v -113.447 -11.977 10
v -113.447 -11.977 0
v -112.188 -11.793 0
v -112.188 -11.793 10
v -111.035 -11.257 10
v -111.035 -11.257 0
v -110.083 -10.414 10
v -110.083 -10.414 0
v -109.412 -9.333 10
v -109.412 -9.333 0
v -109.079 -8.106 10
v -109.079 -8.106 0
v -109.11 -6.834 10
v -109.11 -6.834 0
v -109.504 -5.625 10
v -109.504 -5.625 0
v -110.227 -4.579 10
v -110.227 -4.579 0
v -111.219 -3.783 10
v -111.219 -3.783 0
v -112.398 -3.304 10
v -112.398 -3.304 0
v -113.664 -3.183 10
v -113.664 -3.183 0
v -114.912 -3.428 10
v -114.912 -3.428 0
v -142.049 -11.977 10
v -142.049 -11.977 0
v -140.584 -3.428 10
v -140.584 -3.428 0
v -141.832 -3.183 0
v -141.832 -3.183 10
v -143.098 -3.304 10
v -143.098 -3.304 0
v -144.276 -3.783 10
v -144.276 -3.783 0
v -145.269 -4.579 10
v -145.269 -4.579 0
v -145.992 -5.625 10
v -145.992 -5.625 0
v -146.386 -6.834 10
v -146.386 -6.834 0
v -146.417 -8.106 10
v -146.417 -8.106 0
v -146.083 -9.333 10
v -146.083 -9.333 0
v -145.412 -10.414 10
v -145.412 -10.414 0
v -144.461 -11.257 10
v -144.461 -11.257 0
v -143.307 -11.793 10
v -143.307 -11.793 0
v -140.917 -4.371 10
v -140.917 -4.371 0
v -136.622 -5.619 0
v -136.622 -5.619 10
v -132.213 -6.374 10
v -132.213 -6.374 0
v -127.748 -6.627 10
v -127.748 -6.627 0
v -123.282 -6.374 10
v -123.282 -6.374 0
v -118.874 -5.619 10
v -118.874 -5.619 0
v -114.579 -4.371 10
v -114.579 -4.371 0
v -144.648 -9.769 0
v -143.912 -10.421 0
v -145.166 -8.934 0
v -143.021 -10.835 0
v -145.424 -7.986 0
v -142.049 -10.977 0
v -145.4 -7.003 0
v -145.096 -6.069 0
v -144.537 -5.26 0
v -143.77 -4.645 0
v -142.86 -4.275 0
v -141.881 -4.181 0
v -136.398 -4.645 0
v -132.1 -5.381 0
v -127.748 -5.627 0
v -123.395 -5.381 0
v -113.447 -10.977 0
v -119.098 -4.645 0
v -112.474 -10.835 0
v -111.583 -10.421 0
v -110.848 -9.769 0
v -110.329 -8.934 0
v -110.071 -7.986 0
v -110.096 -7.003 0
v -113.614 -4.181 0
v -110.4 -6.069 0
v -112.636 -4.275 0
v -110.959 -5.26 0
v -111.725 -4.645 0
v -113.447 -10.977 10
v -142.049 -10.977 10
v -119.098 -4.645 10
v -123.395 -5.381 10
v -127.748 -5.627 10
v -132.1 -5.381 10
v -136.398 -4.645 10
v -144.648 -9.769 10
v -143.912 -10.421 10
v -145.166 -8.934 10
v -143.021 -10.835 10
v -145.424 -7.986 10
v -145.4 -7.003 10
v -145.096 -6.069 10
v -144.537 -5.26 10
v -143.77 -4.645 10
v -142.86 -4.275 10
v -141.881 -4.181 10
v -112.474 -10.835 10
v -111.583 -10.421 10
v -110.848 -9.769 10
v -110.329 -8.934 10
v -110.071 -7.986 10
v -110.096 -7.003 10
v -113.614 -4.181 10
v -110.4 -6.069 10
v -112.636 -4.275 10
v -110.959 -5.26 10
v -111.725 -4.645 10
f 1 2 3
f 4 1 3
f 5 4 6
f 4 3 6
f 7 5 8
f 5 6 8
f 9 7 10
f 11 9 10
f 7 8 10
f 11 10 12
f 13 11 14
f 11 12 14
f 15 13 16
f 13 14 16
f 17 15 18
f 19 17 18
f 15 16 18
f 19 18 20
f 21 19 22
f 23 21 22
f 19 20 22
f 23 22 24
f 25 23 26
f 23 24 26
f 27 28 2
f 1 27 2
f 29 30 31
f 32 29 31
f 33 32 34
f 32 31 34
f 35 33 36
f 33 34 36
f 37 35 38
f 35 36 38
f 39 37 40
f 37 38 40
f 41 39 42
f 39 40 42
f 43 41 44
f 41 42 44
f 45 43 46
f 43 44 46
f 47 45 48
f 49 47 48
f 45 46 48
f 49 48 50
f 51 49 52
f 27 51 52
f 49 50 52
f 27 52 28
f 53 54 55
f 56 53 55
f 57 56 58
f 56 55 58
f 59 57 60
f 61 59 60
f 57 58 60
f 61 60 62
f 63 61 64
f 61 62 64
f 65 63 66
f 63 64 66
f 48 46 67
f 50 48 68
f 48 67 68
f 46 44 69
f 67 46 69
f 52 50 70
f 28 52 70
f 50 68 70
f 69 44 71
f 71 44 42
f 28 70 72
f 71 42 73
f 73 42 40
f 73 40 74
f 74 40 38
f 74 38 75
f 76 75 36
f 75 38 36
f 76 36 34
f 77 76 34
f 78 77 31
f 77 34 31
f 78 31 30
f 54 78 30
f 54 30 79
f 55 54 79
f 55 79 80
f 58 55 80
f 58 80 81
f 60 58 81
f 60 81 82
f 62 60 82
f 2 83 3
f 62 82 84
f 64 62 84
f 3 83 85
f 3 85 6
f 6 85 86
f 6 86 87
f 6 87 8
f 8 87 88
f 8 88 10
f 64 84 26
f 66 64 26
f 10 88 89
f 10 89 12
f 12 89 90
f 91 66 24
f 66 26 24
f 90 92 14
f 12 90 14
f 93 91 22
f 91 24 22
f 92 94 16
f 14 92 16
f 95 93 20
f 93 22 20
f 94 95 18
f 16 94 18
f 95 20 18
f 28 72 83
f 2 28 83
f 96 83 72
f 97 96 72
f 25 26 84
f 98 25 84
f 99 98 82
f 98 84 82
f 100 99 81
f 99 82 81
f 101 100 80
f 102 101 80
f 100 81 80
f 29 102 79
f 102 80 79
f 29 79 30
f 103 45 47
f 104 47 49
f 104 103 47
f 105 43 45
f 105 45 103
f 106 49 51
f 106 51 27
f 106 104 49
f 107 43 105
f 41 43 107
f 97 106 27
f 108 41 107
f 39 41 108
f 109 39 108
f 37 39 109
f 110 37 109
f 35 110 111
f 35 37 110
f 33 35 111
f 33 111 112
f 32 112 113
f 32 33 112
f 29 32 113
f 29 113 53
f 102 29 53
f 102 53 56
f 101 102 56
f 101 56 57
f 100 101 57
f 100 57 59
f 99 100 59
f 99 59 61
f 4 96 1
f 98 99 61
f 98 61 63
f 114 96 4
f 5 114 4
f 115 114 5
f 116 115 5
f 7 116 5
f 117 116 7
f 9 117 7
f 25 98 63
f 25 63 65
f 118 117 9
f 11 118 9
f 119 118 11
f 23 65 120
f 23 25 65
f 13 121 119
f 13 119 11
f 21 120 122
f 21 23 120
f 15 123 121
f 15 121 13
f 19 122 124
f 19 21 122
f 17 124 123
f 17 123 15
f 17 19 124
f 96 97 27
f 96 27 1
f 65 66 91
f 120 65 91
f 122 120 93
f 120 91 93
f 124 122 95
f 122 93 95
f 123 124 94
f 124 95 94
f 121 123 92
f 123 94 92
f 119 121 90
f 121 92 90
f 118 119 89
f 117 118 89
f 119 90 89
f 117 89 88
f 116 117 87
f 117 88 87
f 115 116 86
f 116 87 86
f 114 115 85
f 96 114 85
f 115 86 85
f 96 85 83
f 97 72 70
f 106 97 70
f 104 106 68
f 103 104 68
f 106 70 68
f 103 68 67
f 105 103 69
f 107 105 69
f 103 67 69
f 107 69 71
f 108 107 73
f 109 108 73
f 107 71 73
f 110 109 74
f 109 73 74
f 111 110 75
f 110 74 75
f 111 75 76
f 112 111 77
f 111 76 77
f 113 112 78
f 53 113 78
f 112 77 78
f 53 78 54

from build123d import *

# Parameters (mm, degrees)
F1_DEPTH = 10


with BuildPart() as f1:
    # F0 (on Top) → F1 (new body)
    with BuildSketch(Plane.XY):
        with BuildLine():
            ThreePointArc((-114.911513, -3.42815), (-127.747782, -5.627341), (-140.584051, -3.42815))
            ThreePointArc((-140.584051, -3.42815), (-146.385542, -6.834202), (-142.04873, -11.977212))
            Line((-142.04873, -11.977212), (-113.446833, -11.977212))
            ThreePointArc((-113.446833, -11.977212), (-109.110022, -6.834202), (-114.911513, -3.42815))
        make_face()
        with BuildLine():
            Line((-113.446833, -10.977212), (-142.04873, -10.977212))
            ThreePointArc((-142.04873, -10.977212), (-145.399903, -7.003068), (-140.916932, -4.371119))
            ThreePointArc((-140.916932, -4.371119), (-127.747782, -6.627341), (-114.578631, -4.371119))
            ThreePointArc((-114.578631, -4.371119), (-110.095661, -7.003068), (-113.446833, -10.977212))
        make_face(mode=Mode.SUBTRACT)
    extrude(amount=F1_DEPTH)


solid = f1.part
